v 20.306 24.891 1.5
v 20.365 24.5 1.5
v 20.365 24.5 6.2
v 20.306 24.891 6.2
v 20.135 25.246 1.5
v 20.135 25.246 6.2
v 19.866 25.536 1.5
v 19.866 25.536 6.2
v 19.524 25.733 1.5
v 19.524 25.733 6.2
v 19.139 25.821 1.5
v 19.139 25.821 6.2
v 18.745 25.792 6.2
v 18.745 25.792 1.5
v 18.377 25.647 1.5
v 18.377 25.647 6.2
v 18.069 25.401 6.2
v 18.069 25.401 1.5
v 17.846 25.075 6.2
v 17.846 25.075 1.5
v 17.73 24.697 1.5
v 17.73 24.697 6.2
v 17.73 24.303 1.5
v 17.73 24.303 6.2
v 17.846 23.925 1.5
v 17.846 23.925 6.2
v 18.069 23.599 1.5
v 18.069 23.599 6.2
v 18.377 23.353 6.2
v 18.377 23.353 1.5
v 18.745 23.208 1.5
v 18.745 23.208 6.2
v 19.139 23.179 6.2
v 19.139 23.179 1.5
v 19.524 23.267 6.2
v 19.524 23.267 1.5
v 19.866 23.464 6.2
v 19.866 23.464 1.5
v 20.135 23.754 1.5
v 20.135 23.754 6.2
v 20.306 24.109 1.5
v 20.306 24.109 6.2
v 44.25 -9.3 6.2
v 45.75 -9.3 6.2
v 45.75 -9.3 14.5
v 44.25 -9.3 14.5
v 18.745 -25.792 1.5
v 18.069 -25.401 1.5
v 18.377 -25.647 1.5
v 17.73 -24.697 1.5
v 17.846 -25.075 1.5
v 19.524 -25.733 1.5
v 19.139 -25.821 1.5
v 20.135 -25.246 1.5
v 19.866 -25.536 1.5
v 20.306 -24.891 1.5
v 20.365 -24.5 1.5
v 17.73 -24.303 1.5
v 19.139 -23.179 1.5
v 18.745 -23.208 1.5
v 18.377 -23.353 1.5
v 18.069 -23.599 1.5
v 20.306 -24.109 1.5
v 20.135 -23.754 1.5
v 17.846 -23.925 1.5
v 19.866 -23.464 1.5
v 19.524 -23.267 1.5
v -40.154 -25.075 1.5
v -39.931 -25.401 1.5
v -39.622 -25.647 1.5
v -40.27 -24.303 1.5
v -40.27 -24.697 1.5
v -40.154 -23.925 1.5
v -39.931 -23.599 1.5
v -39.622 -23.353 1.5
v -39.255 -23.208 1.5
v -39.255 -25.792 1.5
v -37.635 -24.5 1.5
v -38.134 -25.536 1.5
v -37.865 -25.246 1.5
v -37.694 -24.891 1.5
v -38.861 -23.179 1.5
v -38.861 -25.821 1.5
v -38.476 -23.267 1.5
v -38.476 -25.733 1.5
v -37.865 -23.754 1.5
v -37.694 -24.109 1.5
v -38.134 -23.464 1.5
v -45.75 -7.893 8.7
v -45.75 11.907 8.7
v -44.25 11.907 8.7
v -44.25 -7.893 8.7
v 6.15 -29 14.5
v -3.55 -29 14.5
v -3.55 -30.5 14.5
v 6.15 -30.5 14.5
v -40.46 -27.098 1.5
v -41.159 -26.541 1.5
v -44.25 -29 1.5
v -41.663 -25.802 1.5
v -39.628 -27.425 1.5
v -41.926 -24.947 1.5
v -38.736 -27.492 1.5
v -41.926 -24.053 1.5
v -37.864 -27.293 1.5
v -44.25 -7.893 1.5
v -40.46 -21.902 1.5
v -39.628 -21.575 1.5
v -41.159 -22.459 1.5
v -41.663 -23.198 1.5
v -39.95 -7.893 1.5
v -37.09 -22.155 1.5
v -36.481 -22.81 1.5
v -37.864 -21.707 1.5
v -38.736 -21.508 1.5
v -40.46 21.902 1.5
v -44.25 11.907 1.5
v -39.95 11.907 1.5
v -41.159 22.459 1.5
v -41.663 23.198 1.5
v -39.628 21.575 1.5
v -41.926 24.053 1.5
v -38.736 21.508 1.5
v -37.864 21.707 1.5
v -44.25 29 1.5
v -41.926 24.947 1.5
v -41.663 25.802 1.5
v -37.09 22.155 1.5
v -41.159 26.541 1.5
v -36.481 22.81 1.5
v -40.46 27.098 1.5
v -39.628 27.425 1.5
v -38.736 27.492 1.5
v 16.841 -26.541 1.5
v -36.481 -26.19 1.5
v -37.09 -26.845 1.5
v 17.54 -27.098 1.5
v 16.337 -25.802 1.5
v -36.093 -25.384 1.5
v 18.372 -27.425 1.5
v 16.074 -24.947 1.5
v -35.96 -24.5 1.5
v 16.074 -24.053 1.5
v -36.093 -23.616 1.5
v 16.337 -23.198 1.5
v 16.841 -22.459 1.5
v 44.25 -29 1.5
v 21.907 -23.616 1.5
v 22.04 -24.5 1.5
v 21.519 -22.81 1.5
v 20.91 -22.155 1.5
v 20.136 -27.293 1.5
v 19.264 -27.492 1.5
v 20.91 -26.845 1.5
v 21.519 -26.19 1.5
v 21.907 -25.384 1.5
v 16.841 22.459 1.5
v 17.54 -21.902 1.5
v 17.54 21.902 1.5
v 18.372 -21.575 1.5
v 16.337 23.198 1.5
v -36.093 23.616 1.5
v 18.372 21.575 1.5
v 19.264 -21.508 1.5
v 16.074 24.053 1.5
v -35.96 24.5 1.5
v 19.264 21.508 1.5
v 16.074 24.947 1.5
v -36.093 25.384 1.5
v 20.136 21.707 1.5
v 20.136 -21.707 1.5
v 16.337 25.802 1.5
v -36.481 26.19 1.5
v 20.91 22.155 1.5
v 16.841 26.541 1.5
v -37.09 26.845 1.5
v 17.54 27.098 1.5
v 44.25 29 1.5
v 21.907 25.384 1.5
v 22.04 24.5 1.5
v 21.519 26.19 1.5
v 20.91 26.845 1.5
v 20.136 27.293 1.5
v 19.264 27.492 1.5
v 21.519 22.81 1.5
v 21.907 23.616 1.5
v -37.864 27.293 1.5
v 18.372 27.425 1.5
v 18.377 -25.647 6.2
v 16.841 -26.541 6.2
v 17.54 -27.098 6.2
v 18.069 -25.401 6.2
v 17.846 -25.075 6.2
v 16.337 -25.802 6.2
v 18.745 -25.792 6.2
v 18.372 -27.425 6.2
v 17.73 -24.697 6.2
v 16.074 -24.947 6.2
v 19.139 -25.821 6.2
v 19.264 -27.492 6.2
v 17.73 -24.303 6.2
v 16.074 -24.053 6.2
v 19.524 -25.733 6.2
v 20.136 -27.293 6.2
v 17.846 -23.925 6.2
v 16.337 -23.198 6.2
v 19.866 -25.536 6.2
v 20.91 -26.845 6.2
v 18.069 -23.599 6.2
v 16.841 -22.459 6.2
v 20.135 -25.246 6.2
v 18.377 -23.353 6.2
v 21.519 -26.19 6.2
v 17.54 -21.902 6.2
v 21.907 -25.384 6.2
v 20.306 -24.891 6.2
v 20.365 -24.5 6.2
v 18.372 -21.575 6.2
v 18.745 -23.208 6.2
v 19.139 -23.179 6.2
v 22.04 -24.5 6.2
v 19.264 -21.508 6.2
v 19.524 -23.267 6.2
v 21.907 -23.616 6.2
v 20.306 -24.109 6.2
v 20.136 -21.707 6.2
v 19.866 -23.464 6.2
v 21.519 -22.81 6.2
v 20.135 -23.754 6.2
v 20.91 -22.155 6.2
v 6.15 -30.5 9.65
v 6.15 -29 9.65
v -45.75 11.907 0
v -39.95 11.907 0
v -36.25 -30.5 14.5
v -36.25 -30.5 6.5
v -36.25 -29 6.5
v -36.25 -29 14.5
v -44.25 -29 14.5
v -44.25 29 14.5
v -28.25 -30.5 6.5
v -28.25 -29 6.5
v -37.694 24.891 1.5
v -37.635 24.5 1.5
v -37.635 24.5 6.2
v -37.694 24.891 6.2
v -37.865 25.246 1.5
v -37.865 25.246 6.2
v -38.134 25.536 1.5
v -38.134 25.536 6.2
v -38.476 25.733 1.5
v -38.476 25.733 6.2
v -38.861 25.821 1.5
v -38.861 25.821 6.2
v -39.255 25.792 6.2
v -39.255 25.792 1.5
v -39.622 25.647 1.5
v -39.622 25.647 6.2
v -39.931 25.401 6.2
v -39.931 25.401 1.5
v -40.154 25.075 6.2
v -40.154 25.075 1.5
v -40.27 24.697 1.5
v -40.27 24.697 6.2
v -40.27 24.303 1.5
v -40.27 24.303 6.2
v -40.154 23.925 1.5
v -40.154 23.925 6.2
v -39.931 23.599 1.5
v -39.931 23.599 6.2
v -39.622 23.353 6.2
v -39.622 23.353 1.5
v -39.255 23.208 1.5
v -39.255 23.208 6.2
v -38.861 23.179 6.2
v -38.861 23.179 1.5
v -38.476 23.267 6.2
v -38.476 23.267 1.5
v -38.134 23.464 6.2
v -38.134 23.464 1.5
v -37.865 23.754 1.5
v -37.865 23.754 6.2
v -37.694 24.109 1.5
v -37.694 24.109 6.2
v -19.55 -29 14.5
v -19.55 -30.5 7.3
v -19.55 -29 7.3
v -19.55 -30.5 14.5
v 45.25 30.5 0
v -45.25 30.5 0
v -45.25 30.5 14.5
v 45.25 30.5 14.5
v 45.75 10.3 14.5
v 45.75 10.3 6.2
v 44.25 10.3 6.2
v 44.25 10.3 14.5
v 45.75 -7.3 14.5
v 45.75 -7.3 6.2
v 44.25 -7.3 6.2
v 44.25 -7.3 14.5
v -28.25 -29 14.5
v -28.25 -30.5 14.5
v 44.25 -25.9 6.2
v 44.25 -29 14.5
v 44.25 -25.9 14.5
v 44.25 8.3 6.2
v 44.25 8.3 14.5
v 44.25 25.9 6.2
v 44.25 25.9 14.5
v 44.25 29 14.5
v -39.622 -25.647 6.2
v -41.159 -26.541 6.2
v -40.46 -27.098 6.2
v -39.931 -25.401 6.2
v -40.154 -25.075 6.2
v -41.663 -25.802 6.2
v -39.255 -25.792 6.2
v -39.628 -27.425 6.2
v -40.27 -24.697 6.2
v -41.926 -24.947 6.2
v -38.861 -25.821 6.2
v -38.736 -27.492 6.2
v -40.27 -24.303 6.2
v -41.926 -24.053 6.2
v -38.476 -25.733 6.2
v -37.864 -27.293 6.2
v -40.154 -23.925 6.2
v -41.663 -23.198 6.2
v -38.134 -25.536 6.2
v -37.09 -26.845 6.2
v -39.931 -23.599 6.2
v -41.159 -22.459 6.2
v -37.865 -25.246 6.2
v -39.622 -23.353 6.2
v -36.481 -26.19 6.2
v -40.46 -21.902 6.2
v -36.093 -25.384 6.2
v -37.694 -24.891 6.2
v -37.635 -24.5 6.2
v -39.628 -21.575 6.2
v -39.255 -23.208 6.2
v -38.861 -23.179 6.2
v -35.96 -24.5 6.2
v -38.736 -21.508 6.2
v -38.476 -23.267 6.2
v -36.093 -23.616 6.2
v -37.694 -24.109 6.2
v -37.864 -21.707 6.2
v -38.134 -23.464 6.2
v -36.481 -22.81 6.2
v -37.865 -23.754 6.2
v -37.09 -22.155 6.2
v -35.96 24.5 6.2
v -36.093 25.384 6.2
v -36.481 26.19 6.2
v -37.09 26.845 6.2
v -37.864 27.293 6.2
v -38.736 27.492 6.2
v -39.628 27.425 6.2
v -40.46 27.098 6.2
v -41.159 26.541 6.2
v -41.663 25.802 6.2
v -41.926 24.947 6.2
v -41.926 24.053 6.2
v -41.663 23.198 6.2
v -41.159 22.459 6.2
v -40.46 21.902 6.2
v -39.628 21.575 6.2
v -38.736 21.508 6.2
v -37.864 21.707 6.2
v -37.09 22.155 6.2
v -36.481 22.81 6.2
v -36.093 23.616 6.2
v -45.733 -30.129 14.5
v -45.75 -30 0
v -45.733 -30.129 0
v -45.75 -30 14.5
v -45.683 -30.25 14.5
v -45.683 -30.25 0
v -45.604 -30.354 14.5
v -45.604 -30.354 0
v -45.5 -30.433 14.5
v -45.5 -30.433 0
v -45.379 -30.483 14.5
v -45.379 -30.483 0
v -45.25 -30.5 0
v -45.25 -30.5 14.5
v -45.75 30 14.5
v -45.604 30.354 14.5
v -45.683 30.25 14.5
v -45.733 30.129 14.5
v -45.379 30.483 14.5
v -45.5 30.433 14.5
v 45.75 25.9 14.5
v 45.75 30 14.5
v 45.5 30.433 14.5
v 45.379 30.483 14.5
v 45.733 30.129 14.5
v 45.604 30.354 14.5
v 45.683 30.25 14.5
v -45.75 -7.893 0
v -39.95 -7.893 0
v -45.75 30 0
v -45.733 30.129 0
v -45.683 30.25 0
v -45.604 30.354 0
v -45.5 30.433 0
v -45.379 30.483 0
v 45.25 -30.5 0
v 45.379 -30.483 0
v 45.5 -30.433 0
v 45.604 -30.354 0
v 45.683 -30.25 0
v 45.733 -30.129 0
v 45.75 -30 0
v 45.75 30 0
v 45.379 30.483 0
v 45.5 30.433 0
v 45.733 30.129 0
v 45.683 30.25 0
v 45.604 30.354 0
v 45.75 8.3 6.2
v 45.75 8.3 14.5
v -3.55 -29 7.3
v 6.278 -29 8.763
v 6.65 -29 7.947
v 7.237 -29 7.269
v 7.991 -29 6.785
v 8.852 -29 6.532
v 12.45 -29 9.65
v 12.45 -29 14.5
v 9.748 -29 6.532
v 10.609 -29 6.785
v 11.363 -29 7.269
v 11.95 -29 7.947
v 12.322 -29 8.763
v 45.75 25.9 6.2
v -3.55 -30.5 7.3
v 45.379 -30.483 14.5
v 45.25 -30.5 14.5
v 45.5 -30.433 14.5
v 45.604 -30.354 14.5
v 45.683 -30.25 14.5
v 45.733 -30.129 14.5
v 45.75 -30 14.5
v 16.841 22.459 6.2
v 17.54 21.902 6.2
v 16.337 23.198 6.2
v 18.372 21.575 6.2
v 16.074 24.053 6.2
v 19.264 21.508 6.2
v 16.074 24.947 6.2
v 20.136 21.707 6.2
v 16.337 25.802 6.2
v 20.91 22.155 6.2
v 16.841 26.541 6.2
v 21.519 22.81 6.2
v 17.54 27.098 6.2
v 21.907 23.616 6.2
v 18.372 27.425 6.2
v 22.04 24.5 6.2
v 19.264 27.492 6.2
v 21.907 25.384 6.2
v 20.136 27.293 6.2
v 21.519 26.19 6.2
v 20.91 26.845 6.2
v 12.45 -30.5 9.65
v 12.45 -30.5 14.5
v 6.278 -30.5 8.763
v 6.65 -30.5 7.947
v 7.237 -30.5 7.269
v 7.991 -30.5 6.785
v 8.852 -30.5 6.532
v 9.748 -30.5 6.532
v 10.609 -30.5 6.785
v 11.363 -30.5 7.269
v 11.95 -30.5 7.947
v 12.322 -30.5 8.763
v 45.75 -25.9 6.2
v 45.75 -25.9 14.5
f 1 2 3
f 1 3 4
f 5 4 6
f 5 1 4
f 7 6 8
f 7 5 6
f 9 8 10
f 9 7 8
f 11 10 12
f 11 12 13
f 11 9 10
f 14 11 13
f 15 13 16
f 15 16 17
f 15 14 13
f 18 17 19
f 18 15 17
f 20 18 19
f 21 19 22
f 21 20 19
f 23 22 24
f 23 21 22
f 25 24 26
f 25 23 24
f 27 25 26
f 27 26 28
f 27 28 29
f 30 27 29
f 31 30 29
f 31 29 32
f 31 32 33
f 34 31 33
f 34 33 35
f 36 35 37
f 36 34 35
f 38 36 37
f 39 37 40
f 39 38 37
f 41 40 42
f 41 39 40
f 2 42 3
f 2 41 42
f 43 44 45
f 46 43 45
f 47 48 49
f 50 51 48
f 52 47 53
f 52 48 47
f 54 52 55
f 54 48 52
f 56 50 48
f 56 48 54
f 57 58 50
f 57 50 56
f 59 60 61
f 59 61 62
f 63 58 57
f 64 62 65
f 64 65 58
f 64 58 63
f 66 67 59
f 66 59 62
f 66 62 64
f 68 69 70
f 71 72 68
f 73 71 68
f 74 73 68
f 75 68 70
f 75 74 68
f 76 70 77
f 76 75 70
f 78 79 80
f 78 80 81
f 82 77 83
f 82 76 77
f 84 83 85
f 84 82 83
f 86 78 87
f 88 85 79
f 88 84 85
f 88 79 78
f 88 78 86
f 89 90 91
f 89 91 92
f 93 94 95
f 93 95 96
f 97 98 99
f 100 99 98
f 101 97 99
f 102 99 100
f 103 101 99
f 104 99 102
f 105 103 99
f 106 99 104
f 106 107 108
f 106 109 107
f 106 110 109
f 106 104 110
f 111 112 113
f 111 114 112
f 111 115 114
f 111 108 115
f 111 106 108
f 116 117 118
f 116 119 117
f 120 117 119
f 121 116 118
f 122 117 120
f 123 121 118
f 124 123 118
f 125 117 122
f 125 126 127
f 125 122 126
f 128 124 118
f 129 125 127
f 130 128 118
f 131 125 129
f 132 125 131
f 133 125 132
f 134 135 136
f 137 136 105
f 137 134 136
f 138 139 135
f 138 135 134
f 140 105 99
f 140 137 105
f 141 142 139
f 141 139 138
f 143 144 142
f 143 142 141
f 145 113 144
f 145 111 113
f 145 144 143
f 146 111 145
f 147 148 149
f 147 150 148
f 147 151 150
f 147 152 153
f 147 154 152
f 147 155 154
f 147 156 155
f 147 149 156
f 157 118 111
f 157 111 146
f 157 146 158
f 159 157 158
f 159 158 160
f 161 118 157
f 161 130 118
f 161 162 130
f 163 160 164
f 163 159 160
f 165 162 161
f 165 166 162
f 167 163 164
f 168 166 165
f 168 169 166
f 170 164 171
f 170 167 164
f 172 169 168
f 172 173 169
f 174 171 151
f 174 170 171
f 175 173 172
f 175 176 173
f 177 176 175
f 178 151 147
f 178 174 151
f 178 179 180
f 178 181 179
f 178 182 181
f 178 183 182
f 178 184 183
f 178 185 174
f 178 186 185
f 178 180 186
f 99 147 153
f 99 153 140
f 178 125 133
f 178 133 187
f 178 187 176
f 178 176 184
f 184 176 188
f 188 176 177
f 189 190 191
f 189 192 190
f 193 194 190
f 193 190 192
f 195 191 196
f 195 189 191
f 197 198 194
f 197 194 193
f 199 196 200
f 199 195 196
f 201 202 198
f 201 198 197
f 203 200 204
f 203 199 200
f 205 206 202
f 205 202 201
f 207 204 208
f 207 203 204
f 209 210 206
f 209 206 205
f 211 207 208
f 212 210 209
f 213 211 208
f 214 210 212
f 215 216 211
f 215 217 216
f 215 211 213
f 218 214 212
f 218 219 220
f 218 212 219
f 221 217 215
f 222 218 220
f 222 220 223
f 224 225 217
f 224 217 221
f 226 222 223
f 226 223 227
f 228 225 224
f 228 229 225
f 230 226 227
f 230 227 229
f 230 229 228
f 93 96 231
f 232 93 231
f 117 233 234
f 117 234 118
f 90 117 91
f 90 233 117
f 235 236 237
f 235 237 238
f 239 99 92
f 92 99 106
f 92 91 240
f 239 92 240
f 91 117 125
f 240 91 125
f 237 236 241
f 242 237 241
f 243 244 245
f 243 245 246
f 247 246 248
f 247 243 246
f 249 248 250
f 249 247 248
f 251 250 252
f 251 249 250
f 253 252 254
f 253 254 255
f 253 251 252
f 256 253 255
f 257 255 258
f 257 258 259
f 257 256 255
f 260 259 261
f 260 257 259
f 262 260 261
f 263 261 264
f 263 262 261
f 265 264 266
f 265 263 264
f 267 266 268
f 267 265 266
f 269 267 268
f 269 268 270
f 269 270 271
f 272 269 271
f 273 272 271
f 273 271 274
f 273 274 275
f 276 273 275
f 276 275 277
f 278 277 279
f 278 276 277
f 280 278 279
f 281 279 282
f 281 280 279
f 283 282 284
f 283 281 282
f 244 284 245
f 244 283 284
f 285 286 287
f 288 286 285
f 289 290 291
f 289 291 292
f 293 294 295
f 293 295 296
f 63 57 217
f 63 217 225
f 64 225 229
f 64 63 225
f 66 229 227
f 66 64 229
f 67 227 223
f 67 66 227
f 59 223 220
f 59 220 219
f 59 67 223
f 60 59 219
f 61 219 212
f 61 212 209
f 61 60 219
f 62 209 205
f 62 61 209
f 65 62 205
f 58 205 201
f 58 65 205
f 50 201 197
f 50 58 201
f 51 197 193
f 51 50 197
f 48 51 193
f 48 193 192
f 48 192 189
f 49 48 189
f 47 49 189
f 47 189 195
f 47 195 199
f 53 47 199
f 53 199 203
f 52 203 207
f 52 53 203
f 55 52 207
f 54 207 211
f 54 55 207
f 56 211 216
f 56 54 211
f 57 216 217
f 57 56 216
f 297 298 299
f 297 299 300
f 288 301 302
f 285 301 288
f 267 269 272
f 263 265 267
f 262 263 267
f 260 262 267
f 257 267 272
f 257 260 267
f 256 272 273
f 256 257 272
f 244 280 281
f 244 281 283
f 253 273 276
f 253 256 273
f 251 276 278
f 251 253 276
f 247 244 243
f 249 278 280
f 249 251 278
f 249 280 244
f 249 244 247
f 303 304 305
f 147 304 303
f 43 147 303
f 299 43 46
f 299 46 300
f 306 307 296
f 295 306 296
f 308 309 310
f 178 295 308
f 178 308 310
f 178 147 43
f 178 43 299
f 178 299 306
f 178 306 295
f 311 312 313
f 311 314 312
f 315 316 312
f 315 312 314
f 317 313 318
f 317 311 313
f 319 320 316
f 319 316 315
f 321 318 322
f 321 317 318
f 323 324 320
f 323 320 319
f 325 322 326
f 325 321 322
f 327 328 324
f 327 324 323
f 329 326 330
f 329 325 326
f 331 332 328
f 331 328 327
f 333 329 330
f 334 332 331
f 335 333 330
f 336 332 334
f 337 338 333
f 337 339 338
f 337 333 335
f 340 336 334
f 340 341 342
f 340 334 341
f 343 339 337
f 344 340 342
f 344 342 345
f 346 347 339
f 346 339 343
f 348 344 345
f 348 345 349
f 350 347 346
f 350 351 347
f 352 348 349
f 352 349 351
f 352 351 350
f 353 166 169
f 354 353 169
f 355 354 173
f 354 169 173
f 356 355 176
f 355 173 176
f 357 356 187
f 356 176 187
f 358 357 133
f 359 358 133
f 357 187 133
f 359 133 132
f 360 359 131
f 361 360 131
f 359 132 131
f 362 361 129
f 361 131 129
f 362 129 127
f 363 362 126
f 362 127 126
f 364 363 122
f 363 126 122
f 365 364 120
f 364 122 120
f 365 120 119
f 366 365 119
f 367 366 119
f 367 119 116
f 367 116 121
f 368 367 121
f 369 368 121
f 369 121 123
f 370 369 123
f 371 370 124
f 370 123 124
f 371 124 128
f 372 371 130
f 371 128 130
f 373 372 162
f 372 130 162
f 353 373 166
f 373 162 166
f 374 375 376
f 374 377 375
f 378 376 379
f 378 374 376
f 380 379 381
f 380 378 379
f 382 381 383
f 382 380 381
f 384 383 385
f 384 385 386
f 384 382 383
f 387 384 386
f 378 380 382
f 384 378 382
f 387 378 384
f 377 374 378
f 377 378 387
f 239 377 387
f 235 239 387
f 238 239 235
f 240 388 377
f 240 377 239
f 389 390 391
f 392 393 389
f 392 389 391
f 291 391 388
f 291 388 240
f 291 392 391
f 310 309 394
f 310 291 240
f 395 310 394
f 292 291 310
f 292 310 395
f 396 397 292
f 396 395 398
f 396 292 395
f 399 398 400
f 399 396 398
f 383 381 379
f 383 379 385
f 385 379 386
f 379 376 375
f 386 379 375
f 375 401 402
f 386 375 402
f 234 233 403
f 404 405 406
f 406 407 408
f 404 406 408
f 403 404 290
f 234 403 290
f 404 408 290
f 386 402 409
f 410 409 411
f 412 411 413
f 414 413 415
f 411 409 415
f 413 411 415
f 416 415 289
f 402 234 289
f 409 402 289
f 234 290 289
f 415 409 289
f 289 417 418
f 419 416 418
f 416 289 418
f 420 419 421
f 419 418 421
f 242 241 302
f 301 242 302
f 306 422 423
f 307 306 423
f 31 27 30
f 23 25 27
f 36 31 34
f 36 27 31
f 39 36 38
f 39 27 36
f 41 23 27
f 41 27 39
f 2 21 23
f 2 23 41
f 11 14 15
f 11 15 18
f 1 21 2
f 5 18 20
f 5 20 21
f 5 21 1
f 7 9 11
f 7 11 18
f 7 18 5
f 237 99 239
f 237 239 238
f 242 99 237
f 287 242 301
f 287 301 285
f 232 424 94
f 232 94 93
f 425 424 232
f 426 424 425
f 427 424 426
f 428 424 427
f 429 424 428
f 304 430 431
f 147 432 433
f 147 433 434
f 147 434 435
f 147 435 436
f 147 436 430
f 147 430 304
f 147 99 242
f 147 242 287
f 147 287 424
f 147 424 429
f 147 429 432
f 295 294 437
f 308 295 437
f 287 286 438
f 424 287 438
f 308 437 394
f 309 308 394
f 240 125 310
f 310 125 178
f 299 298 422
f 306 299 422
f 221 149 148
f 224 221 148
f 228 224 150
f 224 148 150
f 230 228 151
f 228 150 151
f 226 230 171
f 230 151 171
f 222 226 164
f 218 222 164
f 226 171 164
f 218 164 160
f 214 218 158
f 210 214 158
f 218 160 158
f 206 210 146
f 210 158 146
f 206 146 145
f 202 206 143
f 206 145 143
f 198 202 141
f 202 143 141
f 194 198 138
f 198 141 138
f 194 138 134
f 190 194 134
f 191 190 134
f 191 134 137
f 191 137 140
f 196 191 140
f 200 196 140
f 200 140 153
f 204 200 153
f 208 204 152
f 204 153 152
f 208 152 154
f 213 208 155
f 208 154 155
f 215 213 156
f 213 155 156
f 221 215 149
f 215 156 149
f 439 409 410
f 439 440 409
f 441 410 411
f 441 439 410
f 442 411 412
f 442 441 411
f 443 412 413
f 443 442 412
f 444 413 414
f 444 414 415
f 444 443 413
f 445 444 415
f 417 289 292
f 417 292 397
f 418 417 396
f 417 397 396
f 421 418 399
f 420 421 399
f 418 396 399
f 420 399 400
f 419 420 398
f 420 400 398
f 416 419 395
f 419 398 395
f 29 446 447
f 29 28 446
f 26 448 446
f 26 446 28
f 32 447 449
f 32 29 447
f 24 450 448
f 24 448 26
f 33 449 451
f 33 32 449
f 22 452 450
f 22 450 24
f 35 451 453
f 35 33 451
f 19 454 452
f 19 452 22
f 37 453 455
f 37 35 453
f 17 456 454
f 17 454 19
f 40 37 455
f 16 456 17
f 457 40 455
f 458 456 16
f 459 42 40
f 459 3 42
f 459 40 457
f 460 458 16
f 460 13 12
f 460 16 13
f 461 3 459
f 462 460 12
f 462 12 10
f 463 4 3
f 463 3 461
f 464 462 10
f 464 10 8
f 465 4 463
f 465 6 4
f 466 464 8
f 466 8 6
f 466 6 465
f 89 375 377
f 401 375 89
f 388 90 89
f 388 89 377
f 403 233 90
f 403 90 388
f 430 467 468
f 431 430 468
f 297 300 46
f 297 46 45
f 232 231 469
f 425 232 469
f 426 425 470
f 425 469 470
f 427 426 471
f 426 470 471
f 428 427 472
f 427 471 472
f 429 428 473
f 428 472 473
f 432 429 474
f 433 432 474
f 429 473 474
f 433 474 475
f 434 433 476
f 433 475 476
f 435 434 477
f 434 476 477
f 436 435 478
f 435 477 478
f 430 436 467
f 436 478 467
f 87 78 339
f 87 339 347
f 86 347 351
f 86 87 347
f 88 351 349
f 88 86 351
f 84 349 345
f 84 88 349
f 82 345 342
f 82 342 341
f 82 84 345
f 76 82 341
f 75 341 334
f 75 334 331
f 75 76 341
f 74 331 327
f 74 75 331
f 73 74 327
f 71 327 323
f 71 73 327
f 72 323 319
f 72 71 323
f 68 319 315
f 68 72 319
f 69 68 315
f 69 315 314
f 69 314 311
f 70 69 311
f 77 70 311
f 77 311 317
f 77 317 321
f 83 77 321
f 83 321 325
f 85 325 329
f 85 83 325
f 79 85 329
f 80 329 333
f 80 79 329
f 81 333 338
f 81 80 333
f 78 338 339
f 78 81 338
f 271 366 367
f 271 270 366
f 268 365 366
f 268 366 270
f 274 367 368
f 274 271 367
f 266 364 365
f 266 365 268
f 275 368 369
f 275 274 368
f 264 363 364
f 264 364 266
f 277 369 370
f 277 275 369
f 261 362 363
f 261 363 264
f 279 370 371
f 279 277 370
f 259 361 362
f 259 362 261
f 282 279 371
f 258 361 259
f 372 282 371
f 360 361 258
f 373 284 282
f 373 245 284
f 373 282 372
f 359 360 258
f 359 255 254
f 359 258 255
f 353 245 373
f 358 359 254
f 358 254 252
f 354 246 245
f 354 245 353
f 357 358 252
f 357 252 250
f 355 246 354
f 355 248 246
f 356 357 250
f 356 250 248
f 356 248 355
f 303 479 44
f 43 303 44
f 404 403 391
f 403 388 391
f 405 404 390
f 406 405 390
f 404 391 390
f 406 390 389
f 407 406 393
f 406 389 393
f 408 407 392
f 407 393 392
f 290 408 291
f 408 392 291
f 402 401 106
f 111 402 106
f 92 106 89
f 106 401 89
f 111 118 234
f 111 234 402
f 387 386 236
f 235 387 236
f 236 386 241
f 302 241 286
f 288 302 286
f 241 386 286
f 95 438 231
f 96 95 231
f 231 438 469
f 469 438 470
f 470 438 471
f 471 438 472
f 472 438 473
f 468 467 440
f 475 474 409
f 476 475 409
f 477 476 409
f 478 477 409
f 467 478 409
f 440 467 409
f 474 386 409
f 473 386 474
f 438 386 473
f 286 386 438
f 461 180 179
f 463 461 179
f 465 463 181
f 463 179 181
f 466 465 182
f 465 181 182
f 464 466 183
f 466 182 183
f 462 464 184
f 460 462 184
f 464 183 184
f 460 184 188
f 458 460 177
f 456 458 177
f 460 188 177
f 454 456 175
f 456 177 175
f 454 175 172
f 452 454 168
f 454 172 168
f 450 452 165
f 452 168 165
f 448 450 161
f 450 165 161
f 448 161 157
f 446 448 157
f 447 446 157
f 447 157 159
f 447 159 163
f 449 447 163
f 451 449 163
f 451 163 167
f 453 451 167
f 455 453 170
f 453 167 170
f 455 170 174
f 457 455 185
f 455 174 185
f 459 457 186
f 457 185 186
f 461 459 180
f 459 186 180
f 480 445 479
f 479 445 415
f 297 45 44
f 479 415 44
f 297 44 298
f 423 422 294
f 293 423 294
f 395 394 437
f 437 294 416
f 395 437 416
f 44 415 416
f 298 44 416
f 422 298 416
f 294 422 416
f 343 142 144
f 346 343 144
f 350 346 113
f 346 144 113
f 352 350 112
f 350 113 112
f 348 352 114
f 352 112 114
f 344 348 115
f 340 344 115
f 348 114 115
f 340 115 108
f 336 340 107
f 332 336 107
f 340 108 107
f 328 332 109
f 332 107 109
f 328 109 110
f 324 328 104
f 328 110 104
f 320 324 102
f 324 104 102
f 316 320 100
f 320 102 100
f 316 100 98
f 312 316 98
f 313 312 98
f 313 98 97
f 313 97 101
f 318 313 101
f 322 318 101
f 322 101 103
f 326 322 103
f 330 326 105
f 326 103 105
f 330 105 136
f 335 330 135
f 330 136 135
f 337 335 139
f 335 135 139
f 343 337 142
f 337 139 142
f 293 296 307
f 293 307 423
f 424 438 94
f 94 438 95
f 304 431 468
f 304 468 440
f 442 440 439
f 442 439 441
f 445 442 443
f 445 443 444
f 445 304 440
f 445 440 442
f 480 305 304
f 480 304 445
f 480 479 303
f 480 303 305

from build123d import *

# Parameters (mm, degrees)
F0_W      = 91.5
F0_H      = 61
F1_DEPTH  = 14.5
F2_T      = -1.5
F3_W      = 8
F3_H      = 8
F3_W_2    = 16
F3_H_2    = 7.2
F4_DEPTH  = 2.1
F5_W      = 19.8
F5_H      = 8.7
F6_DEPTH  = 5.8
F7_W      = 16.6
F7_H      = 8.3
F7_W_2    = 15.6
F8_DEPTH  = 3
F9_R      = 3
F9_R_2    = 1.325
F10_DEPTH = 4.7
F11_R     = 0.5


with BuildPart() as f1:
    # F0 (on Top) → F1 (new body)
    with BuildSketch(Plane.XY):
        Rectangle(F0_W, F0_H)
    extrude(amount=F1_DEPTH)

    # F2
    f2_openings = [f1.faces().sort_by_distance(p)[0] for p in [
        (0, 0, 14.5),
    ]]
    offset(amount=F2_T, openings=f2_openings)

    # F3 (on face) → F4 (cut)
    with BuildSketch(Plane.XZ.offset(30.5)):
        with Locations((-32.25, 10.5)):
            Rectangle(F3_W, F3_H)
        with Locations((-11.55, 10.9)):
            Rectangle(F3_W_2, F3_H_2)
        with BuildLine():
            ThreePointArc((6.15, 9.65), (9.3, 6.5), (12.45, 9.65))
            ThreePointArc((12.45, 9.65), (9.3, 12.8), (6.15, 9.65))
        make_face()
        with BuildLine():
            ThreePointArc((6.15, 9.65), (9.3, 12.8), (12.45, 9.65))
            Line((12.45, 9.65), (12.45, 14.5))
            Line((12.45, 14.5), (6.15, 14.5))
            Line((6.15, 14.5), (6.15, 9.65))
        make_face()
    extrude(amount=-F4_DEPTH, mode=Mode.SUBTRACT)

    # F5 (on face) → F6 (cut)
    with BuildSketch(Plane(origin=(-45.75, 0, 0), x_dir=(0, -1, 0), z_dir=(-1, 0, 0))):
        with Locations((-2.006637, 4.35)):
            Rectangle(F5_W, F5_H)
    extrude(amount=-F6_DEPTH, mode=Mode.SUBTRACT)

    # F7 (on face) → F8 (cut)
    with BuildSketch(Plane.YZ.offset(45.75)):
        with Locations((-17.6, 10.35)):
            Rectangle(F7_W, F7_H)
        with Locations((0.5, 10.35)):
            Rectangle(F7_W_2, F7_H)
        with Locations((18.1, 10.35)):
            Rectangle(F7_W_2, F7_H)
    extrude(amount=-F8_DEPTH, mode=Mode.SUBTRACT)

    # F9 (on face) → F10 (join)
    with BuildSketch(Plane.XY.offset(1.5)):
        with Locations((19.04, 24.5)):
            Circle(F9_R)
        with Locations((19.04, 24.5)):
            Circle(F9_R_2, mode=Mode.SUBTRACT)
        with Locations((19.04, -24.5)):
            Circle(F9_R)
        with Locations((19.04, -24.5)):
            Circle(F9_R_2, mode=Mode.SUBTRACT)
        with Locations((-38.96, 24.5)):
            Circle(F9_R)
        with Locations((-38.96, 24.5)):
            Circle(F9_R_2, mode=Mode.SUBTRACT)
        with Locations((-38.96, -24.5)):
            Circle(F9_R)
        with Locations((-38.96, -24.5)):
            Circle(F9_R_2, mode=Mode.SUBTRACT)
    extrude(amount=F10_DEPTH)

    # F11
    f11_edges = [f1.edges().sort_by_distance(p)[0] for p in [
        (-45.75, -30.5, 7.25),
        (-45.75, 30.5, 7.25),
        (45.75, -30.5, 7.25),
        (45.75, 30.5, 7.25),
    ]]
    fillet(f11_edges, radius=F11_R)


solid = f1.part
